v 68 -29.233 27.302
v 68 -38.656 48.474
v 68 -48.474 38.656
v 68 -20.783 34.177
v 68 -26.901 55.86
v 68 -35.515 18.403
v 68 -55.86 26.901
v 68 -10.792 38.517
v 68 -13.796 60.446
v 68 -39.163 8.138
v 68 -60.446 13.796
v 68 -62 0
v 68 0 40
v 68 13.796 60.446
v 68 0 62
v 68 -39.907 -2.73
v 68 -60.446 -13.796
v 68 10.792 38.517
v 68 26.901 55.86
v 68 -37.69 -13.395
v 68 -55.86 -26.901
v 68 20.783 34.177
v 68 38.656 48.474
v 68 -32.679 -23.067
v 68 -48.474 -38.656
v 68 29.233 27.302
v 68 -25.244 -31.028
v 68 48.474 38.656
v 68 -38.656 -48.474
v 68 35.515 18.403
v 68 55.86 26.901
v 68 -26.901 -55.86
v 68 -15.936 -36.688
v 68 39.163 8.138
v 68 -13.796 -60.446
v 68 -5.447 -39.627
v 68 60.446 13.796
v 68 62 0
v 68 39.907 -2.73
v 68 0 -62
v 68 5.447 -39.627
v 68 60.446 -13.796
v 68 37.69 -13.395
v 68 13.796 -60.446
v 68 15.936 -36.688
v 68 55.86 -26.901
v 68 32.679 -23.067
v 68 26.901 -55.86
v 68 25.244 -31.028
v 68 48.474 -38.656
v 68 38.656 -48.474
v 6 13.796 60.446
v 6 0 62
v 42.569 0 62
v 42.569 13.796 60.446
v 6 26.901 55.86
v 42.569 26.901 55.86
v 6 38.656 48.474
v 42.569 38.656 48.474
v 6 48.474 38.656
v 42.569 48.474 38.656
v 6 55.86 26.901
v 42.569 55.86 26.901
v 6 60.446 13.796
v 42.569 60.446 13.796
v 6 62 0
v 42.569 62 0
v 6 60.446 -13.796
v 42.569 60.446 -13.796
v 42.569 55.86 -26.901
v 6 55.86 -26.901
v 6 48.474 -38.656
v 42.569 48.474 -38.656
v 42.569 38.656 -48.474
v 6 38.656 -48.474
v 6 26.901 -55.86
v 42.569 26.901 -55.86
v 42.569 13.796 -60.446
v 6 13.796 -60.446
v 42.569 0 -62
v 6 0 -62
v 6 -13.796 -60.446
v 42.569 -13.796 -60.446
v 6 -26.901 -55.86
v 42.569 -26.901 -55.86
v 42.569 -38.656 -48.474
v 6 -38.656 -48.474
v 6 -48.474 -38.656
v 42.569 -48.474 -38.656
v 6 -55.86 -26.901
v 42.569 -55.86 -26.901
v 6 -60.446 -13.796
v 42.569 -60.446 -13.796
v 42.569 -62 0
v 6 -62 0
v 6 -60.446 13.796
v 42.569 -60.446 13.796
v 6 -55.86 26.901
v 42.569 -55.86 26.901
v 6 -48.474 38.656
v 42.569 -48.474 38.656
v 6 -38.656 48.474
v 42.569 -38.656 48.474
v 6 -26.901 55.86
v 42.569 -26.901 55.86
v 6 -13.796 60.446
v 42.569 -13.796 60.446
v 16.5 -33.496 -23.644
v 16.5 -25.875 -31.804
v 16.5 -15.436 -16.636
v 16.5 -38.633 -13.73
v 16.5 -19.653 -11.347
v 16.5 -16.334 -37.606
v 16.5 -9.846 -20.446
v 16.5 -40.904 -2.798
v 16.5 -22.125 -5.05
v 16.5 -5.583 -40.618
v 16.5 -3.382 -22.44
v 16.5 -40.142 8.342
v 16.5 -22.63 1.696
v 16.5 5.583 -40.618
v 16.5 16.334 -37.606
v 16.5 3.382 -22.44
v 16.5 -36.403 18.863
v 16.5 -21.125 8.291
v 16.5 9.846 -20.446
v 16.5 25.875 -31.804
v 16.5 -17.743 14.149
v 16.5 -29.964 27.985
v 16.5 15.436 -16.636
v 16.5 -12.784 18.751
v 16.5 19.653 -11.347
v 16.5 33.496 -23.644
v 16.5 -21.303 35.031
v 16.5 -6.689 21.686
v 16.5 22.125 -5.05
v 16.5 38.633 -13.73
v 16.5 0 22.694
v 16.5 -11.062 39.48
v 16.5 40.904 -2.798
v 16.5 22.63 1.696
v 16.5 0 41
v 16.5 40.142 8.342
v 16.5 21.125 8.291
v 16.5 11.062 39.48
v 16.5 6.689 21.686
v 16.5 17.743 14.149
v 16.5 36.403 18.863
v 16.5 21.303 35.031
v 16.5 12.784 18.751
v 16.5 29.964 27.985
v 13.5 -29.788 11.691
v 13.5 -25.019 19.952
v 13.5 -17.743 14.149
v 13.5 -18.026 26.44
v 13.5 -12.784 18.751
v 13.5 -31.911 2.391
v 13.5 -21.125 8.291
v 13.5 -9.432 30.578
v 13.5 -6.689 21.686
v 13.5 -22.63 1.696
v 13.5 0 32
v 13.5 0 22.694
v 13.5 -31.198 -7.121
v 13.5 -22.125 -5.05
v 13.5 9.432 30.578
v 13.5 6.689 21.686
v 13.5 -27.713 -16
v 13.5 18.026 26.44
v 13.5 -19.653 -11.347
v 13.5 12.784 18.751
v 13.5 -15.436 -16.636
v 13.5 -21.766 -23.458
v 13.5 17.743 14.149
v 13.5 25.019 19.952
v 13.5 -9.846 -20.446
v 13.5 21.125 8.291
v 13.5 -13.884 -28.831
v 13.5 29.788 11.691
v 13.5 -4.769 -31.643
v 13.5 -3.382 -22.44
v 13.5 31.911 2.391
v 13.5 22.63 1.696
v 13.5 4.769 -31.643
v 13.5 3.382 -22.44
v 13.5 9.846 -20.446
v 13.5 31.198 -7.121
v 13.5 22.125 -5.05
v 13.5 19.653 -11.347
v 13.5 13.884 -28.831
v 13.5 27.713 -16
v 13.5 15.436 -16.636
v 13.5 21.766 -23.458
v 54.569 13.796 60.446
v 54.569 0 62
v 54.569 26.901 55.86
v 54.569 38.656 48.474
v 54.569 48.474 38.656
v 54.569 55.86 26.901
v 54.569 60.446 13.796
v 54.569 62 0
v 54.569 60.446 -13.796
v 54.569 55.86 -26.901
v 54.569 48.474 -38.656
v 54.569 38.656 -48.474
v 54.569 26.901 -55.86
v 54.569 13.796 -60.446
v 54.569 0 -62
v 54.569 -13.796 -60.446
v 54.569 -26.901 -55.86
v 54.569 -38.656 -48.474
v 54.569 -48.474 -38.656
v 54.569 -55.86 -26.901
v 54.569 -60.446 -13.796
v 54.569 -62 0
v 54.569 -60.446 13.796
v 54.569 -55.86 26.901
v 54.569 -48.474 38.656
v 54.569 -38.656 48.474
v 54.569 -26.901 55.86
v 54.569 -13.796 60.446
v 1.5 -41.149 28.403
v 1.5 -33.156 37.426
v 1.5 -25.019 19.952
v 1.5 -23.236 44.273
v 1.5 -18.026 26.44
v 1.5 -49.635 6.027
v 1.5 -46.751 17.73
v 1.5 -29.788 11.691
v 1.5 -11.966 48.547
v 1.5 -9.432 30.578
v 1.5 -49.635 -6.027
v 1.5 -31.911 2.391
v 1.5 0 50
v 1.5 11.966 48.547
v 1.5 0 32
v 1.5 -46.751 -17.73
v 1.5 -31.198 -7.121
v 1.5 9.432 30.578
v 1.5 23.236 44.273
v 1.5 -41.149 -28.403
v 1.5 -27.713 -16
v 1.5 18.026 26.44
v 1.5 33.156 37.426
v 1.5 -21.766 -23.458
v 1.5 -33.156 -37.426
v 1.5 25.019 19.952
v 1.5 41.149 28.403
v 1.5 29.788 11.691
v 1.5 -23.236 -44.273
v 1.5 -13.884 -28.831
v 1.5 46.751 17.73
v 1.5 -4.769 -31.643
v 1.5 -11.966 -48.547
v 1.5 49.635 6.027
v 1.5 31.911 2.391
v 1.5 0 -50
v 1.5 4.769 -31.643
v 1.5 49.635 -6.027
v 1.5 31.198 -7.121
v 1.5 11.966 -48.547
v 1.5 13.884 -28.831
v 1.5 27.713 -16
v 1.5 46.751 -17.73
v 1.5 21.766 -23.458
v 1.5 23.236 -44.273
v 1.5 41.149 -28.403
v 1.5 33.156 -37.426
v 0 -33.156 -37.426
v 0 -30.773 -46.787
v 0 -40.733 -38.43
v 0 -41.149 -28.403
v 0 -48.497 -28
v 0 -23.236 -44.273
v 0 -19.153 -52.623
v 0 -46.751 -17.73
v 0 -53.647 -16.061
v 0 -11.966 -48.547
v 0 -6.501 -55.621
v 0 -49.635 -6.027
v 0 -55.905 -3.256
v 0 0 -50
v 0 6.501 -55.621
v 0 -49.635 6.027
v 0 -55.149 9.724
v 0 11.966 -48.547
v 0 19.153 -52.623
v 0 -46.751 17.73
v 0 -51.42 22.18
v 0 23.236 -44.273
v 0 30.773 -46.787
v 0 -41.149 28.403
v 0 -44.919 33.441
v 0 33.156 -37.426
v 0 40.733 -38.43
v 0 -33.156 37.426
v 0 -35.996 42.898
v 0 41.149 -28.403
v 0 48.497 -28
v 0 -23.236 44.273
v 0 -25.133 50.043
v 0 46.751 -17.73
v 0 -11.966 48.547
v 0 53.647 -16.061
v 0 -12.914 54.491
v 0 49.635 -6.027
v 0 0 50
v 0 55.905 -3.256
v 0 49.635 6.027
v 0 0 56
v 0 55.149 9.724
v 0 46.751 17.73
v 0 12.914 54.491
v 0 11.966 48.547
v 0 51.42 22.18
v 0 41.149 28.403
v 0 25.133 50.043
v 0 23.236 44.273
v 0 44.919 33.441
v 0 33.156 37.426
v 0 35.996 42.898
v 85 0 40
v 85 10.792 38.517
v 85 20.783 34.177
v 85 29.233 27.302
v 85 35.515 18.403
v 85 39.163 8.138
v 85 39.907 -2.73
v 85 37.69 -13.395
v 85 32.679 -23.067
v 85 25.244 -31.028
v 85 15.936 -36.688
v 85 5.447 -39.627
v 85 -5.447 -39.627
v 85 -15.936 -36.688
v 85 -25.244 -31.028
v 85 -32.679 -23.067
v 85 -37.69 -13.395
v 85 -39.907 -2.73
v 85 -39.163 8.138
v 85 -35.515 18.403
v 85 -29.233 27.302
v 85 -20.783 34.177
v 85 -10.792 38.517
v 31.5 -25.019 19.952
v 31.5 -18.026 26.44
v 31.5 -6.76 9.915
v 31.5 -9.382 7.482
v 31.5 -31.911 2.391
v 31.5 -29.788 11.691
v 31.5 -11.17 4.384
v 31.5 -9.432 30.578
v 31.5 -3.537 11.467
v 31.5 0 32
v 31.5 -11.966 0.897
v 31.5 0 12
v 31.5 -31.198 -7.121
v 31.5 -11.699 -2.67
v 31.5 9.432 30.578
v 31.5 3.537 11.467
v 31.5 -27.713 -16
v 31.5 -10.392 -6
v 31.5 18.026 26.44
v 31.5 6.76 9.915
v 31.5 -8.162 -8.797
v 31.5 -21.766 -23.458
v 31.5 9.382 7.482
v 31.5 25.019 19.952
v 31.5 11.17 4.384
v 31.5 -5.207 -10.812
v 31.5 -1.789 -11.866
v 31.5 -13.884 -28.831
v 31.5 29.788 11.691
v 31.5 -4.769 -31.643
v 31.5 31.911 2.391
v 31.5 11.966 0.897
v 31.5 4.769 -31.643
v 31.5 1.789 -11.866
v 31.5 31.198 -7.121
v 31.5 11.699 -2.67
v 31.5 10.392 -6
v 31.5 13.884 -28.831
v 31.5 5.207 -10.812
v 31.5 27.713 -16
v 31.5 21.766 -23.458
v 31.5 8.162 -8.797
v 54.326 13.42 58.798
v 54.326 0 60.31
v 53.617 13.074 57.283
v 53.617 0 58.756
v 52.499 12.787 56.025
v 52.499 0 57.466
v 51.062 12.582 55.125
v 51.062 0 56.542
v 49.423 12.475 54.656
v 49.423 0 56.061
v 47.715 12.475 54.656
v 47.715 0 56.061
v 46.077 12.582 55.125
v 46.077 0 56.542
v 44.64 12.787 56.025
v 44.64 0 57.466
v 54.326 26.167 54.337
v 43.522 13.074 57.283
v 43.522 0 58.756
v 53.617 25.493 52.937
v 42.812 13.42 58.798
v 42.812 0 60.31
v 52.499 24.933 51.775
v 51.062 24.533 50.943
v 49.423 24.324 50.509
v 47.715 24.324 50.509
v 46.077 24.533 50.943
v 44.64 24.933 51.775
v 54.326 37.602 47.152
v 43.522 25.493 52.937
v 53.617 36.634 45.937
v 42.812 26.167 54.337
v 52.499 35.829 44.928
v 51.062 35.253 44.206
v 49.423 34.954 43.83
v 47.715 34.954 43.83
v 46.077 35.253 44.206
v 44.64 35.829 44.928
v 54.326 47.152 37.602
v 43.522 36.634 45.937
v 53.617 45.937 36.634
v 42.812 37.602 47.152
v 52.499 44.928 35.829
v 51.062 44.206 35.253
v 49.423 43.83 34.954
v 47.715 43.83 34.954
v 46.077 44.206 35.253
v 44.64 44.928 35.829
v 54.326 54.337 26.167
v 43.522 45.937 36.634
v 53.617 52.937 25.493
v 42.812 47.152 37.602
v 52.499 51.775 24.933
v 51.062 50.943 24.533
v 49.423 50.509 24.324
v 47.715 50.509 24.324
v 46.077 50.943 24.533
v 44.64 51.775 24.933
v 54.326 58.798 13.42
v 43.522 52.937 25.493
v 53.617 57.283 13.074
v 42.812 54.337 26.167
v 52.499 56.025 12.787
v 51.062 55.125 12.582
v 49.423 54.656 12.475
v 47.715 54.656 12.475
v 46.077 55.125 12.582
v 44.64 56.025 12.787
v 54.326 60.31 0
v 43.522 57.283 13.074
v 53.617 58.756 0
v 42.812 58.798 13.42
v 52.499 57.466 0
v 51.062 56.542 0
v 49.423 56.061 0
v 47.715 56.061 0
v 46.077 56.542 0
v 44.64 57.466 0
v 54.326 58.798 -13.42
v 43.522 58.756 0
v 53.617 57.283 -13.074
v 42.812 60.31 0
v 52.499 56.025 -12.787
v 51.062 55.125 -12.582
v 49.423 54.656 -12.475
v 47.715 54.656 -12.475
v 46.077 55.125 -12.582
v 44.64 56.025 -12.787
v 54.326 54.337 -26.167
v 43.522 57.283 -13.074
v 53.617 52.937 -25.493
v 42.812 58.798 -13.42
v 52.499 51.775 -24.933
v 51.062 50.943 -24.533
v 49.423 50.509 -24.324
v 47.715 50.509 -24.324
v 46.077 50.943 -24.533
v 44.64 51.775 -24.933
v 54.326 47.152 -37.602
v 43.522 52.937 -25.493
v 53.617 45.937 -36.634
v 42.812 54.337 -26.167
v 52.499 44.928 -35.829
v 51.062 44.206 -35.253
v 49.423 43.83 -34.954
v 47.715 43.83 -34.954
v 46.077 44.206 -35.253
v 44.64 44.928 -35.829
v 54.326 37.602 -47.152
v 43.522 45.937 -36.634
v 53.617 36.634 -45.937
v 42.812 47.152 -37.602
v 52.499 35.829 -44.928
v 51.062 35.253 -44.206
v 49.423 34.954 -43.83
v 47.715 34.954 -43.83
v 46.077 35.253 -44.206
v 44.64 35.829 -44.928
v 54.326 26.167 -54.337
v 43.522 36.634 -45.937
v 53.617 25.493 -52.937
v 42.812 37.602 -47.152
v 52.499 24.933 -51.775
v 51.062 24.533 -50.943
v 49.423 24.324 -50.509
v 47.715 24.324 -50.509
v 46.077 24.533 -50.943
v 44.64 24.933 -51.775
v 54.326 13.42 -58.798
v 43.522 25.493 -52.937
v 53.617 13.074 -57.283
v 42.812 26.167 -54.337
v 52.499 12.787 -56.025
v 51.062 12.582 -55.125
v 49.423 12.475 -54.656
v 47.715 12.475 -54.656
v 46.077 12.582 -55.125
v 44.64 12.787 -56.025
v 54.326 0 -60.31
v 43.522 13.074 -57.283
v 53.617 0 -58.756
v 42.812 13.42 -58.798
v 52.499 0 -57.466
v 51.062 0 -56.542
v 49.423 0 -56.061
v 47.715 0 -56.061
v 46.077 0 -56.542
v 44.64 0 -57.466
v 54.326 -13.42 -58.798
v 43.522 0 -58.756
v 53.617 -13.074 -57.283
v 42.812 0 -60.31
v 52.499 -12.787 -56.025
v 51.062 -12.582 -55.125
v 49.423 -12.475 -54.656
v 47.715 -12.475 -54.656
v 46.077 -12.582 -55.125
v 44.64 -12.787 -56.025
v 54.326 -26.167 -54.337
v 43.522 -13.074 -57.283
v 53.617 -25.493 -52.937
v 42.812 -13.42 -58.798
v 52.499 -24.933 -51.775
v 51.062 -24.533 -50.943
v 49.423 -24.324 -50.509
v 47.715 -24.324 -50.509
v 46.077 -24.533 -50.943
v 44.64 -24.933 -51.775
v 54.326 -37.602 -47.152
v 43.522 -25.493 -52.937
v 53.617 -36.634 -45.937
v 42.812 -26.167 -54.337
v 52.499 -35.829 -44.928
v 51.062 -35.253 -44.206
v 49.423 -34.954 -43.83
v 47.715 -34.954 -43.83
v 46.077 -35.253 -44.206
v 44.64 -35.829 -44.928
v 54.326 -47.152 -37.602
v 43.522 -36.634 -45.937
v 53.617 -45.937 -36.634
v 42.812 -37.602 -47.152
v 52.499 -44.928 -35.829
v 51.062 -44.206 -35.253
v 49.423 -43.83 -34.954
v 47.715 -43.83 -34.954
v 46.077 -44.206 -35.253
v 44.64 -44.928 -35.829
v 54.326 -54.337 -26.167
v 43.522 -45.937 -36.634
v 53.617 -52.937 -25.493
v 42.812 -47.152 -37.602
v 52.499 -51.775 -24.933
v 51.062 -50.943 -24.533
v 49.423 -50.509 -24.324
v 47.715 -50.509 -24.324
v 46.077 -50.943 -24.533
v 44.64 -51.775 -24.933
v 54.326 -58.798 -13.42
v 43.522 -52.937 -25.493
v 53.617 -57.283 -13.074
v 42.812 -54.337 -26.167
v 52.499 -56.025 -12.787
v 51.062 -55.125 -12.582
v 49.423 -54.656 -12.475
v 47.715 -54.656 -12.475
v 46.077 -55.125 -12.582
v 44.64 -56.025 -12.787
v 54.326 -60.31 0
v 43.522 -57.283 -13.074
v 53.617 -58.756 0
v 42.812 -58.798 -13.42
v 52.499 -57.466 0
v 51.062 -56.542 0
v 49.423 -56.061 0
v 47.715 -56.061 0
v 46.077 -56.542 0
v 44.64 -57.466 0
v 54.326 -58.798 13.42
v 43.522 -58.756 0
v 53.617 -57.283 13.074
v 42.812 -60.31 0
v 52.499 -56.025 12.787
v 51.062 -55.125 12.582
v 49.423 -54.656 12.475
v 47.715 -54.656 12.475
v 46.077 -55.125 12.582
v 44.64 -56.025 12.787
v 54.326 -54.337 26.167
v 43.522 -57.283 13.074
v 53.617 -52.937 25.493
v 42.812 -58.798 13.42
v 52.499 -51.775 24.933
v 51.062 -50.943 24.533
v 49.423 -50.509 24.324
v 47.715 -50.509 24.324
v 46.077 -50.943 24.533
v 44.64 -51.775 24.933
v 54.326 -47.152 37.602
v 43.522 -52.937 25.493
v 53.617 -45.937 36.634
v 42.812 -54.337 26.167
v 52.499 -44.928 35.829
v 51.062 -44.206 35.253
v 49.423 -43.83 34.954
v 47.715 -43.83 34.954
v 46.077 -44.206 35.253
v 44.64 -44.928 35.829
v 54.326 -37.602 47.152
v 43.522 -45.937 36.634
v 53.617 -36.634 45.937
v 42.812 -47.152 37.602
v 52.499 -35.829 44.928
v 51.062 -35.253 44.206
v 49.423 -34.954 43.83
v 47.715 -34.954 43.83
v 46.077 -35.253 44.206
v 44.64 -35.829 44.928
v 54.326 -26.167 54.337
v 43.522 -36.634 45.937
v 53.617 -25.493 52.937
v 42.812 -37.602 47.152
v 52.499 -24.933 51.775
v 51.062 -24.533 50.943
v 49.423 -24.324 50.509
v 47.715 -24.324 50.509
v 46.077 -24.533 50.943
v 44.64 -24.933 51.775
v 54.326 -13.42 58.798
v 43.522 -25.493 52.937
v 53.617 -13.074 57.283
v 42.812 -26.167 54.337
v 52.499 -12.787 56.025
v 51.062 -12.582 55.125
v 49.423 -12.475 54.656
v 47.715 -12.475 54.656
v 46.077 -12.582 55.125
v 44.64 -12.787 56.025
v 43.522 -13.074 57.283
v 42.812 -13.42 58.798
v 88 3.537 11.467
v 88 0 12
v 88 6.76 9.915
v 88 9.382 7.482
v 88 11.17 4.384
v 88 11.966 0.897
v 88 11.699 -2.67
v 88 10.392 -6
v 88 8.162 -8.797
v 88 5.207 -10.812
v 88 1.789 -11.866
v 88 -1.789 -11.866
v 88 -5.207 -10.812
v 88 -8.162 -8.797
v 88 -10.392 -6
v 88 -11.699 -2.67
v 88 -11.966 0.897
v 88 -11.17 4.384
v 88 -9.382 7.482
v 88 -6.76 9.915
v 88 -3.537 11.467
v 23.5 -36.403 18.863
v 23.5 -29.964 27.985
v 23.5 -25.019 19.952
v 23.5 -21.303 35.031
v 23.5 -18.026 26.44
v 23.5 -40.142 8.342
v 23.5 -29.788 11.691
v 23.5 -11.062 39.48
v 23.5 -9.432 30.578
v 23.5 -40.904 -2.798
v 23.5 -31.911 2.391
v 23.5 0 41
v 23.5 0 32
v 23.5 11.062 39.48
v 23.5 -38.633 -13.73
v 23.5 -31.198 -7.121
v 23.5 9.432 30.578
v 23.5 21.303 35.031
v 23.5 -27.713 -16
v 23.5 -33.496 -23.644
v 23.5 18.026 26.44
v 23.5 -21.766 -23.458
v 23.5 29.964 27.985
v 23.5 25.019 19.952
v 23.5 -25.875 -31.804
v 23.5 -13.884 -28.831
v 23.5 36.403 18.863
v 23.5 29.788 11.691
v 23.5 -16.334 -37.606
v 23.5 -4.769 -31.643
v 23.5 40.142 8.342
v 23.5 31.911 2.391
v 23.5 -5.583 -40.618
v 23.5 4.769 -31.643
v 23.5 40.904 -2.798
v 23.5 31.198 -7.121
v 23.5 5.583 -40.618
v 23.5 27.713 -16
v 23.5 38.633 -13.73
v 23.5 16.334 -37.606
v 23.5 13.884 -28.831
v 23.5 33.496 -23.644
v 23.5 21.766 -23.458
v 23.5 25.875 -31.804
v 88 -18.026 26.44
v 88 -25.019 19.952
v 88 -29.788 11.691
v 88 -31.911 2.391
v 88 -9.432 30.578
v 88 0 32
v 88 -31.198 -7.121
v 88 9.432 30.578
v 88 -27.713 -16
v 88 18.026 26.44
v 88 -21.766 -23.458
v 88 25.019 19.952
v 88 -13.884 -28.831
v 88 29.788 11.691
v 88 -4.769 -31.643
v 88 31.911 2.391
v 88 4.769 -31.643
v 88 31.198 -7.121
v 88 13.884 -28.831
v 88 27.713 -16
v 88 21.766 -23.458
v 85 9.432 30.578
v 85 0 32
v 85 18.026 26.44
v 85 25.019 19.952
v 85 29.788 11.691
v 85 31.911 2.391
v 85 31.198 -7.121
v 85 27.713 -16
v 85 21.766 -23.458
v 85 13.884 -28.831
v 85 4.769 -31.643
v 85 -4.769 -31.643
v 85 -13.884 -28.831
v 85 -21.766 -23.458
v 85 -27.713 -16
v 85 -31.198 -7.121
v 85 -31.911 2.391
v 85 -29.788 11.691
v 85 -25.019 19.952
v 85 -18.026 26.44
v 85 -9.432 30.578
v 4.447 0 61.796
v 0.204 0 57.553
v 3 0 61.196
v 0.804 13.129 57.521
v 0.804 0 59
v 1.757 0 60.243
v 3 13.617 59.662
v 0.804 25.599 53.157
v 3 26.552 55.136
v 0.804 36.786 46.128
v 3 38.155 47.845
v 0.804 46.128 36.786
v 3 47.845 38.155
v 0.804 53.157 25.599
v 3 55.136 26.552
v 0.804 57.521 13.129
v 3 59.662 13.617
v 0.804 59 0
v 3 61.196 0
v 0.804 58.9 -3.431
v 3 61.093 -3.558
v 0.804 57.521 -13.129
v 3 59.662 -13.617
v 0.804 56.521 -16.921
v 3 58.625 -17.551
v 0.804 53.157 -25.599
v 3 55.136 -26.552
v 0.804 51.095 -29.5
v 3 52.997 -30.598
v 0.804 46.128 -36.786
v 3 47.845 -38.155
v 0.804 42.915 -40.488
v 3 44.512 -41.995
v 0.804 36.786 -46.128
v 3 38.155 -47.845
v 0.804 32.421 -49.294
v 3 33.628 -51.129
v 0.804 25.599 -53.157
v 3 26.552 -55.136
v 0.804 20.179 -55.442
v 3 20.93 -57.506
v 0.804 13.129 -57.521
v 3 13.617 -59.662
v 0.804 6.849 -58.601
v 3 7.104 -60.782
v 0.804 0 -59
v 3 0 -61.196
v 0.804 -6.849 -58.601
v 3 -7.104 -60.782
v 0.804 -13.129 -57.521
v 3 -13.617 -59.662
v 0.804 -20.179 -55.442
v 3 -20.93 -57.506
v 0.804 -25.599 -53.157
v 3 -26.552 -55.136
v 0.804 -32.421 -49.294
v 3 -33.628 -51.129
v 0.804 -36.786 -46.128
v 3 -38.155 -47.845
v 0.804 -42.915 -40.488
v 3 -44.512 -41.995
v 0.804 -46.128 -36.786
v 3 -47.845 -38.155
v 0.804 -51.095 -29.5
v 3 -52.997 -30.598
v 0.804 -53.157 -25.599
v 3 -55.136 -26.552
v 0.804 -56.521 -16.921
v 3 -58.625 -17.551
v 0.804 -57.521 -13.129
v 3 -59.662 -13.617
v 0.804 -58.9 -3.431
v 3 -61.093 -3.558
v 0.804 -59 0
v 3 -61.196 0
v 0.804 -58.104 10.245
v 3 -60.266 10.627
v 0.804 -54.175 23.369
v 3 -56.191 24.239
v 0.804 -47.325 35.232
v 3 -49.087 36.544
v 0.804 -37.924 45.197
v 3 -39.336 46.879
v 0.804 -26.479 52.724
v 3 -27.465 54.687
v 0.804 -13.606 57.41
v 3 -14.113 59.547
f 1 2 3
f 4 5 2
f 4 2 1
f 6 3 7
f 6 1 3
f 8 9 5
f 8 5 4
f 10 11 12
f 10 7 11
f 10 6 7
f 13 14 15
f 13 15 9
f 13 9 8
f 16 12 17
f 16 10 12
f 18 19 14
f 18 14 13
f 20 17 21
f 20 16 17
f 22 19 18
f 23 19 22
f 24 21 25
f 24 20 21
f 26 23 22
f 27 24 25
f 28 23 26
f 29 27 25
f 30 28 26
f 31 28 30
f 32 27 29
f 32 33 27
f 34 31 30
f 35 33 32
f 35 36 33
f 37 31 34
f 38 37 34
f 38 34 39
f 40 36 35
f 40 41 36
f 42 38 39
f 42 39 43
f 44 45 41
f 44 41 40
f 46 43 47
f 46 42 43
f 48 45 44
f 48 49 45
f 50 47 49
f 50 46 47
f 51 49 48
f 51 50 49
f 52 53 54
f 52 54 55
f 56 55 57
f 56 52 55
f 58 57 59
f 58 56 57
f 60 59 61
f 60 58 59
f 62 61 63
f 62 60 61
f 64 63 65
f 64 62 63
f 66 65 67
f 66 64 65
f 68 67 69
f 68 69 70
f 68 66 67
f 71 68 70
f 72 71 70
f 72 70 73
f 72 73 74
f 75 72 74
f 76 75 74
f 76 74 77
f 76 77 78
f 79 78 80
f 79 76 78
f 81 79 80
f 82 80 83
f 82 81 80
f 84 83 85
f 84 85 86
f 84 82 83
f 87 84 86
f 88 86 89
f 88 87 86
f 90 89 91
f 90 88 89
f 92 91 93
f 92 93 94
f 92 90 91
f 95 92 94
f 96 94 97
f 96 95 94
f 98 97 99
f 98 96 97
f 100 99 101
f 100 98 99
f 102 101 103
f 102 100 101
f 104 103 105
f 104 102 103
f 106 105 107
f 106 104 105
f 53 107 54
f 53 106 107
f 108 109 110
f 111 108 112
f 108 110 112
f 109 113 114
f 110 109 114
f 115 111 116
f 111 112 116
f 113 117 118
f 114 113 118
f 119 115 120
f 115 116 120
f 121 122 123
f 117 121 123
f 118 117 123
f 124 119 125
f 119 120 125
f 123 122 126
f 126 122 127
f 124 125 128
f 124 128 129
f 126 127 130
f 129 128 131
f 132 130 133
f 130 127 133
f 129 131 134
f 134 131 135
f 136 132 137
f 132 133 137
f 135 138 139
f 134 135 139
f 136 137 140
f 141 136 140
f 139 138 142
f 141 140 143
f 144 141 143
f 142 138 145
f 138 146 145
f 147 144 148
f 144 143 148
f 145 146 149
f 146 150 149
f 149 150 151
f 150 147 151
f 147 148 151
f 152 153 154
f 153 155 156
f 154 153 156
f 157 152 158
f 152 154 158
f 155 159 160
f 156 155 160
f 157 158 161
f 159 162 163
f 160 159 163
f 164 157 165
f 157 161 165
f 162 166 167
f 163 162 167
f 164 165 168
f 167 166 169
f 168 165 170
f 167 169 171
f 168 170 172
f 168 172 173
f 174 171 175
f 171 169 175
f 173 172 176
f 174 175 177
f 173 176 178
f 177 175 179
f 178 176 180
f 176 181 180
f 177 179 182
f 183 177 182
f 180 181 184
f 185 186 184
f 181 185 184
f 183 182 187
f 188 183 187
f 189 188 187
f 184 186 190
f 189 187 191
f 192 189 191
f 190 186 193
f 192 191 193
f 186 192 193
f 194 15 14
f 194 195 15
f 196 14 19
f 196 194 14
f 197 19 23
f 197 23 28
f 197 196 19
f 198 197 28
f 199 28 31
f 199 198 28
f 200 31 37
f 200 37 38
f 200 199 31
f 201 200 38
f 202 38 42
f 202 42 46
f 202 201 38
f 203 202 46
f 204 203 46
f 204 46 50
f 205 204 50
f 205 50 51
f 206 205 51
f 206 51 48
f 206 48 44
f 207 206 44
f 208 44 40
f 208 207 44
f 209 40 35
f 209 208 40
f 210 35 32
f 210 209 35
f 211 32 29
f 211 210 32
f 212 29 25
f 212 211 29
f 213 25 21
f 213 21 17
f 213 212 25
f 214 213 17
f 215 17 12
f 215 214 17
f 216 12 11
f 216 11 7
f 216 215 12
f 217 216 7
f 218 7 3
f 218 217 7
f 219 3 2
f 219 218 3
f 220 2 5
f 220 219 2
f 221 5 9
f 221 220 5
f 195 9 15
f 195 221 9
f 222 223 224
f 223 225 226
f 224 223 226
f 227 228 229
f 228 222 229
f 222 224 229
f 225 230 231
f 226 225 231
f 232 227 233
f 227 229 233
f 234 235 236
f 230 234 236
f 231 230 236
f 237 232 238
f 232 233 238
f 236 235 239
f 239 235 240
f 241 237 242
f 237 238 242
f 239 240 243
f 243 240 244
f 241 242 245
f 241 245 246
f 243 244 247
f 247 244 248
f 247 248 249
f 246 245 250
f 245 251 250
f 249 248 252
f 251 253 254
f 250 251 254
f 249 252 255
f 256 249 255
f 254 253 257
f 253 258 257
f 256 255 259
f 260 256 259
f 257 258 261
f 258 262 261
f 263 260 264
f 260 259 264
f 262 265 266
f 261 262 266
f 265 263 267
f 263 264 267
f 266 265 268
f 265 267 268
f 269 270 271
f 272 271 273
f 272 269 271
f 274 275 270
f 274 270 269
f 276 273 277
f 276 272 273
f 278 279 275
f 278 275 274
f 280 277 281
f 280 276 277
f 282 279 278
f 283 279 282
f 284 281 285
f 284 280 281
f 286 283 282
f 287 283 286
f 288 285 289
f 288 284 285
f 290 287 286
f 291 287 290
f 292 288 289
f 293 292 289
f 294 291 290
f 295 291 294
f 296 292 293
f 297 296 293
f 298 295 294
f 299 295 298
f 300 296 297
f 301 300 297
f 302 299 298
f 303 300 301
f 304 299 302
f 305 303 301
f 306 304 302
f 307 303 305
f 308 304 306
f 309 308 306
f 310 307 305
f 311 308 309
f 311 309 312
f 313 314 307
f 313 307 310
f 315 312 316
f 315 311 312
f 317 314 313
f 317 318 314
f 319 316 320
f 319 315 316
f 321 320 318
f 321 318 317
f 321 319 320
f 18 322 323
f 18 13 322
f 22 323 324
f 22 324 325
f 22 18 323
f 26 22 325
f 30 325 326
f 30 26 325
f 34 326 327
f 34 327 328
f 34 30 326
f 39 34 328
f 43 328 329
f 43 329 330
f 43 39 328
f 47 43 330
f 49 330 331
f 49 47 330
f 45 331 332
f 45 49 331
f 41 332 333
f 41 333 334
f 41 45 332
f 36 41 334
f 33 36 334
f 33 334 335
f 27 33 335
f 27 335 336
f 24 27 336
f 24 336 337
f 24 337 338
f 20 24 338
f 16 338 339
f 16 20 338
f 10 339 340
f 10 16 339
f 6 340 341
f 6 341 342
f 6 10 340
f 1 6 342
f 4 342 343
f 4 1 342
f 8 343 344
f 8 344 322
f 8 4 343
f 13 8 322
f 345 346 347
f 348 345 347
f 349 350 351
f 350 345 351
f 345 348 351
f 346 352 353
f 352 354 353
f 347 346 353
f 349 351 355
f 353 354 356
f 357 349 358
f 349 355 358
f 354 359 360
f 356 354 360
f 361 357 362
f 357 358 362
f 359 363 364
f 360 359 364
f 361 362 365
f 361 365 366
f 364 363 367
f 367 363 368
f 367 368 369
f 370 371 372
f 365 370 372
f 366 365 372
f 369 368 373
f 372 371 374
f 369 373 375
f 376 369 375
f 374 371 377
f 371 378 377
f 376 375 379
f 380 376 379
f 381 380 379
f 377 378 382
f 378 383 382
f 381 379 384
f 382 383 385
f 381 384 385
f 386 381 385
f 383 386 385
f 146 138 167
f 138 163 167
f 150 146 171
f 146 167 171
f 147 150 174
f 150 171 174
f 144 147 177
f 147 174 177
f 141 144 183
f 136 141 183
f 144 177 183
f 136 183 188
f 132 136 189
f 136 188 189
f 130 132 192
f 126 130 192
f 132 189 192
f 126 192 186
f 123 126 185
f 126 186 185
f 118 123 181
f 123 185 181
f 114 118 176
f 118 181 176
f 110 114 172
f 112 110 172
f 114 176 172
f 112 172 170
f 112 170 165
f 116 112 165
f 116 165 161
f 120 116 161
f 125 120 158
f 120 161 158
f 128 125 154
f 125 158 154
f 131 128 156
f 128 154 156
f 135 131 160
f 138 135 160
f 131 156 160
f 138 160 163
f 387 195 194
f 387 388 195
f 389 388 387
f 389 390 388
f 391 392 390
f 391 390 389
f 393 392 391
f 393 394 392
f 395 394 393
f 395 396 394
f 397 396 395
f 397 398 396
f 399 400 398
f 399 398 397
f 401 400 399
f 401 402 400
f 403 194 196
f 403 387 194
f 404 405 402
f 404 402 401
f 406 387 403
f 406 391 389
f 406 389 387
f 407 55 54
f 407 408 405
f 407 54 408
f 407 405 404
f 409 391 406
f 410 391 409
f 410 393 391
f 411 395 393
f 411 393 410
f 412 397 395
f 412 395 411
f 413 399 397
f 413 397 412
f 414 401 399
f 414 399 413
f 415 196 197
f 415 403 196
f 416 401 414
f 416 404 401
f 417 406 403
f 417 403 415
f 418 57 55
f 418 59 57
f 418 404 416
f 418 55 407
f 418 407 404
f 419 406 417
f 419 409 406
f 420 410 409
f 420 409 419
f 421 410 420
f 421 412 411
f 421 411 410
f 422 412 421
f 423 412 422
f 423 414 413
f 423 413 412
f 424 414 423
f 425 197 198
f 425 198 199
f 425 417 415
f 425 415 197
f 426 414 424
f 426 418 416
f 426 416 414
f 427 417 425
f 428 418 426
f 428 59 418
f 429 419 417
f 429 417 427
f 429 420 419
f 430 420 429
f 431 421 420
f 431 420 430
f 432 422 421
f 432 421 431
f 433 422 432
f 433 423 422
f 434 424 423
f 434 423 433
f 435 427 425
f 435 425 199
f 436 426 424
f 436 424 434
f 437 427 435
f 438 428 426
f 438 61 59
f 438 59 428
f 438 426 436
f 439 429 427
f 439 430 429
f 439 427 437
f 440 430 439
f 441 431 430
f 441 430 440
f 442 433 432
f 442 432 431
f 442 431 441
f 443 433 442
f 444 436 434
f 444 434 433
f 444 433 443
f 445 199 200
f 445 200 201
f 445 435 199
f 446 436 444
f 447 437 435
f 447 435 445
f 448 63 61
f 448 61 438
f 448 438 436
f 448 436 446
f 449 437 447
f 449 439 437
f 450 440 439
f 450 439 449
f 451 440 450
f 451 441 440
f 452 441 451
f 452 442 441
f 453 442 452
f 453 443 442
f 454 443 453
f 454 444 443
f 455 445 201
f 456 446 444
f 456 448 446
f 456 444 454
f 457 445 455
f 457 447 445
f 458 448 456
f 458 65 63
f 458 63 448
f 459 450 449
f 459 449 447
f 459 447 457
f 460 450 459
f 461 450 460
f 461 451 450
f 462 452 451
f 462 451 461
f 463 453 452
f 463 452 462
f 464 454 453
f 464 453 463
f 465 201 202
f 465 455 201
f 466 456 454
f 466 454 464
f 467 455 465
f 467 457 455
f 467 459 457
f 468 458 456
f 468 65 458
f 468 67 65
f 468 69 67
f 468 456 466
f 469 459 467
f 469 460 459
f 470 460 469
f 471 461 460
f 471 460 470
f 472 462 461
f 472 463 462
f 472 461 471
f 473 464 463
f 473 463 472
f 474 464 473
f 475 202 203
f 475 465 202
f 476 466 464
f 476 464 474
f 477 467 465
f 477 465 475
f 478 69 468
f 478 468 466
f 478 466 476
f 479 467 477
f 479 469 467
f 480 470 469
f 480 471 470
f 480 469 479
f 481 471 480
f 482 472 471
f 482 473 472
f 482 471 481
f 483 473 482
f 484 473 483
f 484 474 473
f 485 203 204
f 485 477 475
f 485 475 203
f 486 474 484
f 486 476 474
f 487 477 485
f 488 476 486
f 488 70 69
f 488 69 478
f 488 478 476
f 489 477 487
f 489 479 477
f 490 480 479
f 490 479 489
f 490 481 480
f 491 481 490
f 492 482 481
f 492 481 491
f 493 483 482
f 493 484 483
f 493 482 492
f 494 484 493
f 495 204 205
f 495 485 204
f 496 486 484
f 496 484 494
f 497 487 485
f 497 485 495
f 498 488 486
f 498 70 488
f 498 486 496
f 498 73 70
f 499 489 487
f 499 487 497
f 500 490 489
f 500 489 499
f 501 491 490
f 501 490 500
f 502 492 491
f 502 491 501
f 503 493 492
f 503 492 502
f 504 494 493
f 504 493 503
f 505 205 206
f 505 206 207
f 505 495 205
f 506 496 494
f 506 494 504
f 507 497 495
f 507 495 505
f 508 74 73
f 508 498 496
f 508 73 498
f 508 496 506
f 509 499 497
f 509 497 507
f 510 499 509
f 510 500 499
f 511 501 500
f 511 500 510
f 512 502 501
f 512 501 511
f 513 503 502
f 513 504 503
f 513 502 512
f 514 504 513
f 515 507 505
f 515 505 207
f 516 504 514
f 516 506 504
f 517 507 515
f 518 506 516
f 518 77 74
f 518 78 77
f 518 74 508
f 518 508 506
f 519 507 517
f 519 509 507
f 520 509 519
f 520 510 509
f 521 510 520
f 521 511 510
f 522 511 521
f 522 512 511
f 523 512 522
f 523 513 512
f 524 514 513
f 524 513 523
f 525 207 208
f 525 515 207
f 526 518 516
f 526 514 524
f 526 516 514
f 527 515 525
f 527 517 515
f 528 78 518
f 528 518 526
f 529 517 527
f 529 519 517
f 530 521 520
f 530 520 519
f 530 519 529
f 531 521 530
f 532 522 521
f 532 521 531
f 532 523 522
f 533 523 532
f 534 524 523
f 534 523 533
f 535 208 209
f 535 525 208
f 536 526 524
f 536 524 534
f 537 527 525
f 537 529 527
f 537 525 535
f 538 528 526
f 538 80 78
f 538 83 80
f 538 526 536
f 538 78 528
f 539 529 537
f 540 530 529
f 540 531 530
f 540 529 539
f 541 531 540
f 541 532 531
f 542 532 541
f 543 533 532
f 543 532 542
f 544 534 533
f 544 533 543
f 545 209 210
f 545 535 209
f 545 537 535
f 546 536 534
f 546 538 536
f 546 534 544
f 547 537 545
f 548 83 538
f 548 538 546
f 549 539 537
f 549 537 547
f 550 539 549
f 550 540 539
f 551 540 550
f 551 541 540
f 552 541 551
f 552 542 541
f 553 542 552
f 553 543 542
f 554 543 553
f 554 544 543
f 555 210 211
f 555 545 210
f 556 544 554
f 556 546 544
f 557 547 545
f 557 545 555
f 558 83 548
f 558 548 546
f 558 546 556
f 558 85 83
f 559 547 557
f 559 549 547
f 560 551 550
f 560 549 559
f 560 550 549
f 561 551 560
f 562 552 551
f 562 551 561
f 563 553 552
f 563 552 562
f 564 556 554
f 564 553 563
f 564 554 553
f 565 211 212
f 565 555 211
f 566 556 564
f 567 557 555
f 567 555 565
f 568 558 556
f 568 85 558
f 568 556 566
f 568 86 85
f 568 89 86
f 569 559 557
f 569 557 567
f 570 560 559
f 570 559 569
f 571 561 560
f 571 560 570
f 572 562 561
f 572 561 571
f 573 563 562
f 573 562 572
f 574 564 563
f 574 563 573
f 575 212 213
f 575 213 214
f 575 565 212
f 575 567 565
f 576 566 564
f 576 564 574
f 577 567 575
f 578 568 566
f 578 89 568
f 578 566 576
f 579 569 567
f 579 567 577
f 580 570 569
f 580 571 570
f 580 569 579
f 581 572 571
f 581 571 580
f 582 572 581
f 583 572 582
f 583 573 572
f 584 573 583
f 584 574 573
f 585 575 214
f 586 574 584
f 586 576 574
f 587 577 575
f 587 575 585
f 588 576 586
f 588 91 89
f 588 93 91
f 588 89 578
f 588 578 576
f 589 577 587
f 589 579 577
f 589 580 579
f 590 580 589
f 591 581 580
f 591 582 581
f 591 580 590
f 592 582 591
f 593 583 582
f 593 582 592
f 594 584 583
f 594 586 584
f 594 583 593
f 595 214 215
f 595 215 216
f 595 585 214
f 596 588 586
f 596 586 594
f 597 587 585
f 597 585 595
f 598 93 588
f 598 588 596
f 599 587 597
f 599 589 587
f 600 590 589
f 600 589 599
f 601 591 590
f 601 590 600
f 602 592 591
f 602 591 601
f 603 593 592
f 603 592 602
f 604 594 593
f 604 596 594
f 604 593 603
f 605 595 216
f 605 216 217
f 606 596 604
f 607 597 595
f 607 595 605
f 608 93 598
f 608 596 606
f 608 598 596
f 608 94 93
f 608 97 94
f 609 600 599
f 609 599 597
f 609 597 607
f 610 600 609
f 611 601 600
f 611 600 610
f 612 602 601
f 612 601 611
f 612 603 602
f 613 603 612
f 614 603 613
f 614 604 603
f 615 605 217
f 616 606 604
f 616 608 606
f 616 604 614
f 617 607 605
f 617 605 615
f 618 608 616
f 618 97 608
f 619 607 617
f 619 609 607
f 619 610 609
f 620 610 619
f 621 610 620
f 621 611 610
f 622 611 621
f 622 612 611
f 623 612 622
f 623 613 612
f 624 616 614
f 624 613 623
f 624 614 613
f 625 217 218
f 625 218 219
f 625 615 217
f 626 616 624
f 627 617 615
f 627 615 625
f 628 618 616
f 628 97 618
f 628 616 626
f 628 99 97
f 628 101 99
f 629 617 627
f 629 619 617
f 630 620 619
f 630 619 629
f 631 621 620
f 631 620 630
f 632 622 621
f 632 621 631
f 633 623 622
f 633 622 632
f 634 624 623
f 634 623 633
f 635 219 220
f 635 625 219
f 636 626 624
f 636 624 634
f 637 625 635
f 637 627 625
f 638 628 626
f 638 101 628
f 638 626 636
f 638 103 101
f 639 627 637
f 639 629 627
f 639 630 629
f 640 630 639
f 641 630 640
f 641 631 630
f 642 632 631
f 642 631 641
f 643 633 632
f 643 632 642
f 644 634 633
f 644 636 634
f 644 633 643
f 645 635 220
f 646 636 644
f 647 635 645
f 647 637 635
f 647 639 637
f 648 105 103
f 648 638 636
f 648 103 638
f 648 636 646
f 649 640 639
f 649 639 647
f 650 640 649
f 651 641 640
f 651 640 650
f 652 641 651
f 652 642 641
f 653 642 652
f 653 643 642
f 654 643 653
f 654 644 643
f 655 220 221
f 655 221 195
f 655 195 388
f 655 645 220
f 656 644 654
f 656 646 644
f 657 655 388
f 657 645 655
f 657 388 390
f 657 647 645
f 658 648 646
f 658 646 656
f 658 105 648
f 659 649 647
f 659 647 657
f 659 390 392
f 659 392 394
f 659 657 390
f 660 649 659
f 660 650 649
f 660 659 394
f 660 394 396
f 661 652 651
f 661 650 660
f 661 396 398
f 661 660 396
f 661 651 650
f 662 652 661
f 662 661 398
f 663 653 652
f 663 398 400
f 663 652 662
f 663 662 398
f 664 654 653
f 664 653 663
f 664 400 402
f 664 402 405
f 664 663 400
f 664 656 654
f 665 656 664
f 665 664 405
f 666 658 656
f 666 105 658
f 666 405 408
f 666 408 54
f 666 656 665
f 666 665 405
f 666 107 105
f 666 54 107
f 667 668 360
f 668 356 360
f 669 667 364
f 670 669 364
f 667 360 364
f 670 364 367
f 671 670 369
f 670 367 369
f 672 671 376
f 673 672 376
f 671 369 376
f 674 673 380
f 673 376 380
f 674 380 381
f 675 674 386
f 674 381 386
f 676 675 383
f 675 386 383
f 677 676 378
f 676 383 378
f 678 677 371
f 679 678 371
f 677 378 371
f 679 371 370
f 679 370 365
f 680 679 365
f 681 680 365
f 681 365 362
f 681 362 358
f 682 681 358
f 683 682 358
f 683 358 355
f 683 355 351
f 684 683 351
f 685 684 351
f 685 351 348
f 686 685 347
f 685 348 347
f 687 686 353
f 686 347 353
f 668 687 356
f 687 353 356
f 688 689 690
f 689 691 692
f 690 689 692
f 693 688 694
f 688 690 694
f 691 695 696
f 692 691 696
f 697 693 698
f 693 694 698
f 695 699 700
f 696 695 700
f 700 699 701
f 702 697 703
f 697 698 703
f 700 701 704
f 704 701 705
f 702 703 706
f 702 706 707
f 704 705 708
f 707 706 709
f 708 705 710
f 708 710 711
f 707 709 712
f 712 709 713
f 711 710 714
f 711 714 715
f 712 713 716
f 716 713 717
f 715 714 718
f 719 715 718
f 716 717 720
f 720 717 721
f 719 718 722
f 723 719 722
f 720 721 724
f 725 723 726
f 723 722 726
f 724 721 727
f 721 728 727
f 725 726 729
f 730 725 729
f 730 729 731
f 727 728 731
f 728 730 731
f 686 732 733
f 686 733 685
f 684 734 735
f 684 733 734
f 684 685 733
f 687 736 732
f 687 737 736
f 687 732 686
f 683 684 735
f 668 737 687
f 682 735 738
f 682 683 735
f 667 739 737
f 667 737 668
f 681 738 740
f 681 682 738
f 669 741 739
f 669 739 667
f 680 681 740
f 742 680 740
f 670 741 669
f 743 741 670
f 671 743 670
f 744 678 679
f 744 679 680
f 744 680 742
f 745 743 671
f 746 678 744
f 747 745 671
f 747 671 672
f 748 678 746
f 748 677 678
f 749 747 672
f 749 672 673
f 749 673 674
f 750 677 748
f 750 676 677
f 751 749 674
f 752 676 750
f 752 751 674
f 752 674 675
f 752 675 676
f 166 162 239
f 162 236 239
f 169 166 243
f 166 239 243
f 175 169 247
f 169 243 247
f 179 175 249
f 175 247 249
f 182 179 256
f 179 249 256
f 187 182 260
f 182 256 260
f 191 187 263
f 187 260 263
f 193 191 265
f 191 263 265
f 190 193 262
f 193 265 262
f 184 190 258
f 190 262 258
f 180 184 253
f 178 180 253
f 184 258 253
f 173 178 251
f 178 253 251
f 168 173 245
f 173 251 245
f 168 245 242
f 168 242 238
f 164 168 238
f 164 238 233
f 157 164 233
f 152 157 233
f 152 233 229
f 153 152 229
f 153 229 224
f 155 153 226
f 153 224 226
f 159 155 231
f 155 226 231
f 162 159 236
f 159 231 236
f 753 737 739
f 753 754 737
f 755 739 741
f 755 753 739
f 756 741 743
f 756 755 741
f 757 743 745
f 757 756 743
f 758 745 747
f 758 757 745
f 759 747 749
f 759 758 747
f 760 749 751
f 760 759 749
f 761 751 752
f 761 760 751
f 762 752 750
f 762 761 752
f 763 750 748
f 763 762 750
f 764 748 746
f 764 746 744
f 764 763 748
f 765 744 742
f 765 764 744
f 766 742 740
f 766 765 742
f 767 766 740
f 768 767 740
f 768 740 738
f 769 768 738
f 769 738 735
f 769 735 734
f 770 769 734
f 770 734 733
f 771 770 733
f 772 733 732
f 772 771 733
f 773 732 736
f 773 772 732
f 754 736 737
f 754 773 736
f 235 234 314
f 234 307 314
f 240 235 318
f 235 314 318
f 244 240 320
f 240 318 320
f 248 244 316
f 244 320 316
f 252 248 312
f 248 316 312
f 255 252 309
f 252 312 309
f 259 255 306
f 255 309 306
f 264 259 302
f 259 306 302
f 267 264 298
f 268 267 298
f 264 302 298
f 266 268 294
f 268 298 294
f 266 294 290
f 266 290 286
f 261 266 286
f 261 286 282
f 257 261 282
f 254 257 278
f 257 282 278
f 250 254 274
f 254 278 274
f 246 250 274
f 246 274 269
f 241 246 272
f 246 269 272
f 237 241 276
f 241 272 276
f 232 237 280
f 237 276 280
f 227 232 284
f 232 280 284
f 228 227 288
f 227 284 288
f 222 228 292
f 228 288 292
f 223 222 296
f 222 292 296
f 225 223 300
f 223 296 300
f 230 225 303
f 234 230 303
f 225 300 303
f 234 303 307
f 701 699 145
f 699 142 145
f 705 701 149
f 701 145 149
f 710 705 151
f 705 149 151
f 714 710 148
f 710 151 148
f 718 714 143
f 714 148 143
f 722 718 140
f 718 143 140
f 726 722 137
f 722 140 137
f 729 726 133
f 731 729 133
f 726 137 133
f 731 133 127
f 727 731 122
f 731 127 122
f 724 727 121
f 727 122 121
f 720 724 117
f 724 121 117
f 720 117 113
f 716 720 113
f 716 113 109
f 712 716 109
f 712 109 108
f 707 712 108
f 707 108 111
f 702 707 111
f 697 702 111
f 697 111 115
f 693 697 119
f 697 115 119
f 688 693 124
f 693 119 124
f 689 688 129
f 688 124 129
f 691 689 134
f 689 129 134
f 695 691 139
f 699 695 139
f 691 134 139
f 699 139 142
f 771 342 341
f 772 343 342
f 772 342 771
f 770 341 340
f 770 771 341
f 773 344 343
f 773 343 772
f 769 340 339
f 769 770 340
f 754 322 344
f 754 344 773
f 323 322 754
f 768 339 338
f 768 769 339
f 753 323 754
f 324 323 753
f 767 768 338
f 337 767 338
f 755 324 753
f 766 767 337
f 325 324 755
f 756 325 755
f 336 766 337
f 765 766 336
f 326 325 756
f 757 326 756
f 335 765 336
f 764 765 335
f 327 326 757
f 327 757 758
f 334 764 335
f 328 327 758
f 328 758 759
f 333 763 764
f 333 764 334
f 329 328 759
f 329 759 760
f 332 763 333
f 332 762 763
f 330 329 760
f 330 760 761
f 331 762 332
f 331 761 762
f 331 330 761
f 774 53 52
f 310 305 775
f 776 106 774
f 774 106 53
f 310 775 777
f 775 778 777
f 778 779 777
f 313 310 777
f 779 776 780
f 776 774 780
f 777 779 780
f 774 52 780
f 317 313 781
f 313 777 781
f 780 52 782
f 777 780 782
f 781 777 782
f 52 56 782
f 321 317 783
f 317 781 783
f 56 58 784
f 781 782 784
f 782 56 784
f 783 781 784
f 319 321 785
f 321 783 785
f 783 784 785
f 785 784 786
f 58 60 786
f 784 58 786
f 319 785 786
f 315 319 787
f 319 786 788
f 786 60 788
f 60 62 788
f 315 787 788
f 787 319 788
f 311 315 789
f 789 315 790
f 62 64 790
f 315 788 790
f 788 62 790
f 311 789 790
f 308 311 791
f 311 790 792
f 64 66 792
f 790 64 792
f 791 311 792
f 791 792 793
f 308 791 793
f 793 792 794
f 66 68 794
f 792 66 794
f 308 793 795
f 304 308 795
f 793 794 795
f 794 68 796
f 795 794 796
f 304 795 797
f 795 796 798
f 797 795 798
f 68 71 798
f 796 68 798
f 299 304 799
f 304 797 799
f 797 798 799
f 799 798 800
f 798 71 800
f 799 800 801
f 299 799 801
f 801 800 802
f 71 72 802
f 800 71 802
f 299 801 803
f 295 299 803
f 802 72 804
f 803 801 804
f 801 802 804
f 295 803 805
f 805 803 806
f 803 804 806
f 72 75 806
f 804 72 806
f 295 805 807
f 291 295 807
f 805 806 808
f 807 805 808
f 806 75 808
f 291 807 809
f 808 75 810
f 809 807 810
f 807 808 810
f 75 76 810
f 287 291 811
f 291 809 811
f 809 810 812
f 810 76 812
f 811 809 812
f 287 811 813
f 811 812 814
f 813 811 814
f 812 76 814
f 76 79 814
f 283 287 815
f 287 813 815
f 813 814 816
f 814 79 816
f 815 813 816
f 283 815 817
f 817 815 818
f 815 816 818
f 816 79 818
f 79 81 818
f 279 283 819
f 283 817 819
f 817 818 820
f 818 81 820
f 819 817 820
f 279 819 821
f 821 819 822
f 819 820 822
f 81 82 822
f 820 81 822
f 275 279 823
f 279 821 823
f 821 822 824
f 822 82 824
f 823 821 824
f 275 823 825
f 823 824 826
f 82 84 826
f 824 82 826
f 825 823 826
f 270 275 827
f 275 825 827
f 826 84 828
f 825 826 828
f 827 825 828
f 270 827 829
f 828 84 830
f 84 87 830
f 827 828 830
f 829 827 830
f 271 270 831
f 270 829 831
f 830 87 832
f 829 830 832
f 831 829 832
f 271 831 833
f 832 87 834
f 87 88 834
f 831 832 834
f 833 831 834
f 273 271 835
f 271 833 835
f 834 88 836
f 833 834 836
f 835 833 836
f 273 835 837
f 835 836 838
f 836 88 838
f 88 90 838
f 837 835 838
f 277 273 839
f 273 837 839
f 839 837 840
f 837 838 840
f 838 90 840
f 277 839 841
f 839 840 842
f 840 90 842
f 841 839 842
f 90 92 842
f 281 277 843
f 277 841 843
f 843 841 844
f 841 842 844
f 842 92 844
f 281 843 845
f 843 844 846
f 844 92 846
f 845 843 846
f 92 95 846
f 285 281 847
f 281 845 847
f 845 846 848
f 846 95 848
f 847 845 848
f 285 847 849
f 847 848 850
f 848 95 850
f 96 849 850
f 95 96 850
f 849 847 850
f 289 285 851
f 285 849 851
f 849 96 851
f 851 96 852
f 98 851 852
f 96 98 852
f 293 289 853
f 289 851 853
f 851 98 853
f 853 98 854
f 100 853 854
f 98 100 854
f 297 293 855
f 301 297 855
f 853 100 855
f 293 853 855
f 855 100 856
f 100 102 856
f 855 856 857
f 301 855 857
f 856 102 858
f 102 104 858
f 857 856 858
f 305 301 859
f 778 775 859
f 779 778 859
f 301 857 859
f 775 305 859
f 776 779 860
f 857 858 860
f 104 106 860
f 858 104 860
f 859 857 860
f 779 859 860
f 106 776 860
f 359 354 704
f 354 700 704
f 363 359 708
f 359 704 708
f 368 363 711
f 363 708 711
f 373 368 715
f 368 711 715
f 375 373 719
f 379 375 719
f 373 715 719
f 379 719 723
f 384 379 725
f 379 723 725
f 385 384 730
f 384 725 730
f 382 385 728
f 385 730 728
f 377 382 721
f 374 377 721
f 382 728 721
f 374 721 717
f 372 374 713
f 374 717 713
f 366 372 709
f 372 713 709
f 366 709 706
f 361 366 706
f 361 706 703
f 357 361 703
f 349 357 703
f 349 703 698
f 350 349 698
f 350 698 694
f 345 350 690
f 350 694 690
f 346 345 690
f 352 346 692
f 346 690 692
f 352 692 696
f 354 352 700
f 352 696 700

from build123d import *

# Parameters (mm, degrees)
F4_R = 6


with BuildPart() as f1:
    # F0 (on Front) → F1 (revolve)
    with BuildSketch(Plane.XZ):
        with BuildLine():
            Line((0, 62), (0, 0))
            Line((0, 0), (88, 0))
            Line((88, 0), (88, 32))
            Line((88, 32), (85, 32))
            Line((85, 32), (85, 40))
            Line((85, 40), (68, 40))
            Line((68, 40), (68, 62))
            Line((68, 62), (54.569368, 62))
            ThreePointArc((54.569368, 62), (48.569368, 56), (42.569368, 62))
            Line((42.569368, 62), (0, 62))
        make_face()
    revolve(axis=Axis((-15.071996, 0, 0), (-1, 0, 0)))

    # F2 (on Front) → F3 (revolve, cut)
    with BuildSketch(Plane.XZ):
        Polygon((0, 50), (0, 0), (88, 0), (88, 12), (31.5, 12), (31.5, 32), (23.5, 32), (23.5, 41), (16.5, 41), (16.5, 22.69382), (13.5, 22.69382), (13.5, 32), (1.5, 32), (1.5, 50), align=None)
    revolve(axis=Axis((-15.359187, 0, 0), (-1, 0, 0)), mode=Mode.SUBTRACT)

    # F4
    f4_edges = [f1.edges().sort_by_distance(p)[0] for p in [
        (0, 0, -62),
    ]]
    fillet(f4_edges, radius=F4_R)


solid = f1.part
